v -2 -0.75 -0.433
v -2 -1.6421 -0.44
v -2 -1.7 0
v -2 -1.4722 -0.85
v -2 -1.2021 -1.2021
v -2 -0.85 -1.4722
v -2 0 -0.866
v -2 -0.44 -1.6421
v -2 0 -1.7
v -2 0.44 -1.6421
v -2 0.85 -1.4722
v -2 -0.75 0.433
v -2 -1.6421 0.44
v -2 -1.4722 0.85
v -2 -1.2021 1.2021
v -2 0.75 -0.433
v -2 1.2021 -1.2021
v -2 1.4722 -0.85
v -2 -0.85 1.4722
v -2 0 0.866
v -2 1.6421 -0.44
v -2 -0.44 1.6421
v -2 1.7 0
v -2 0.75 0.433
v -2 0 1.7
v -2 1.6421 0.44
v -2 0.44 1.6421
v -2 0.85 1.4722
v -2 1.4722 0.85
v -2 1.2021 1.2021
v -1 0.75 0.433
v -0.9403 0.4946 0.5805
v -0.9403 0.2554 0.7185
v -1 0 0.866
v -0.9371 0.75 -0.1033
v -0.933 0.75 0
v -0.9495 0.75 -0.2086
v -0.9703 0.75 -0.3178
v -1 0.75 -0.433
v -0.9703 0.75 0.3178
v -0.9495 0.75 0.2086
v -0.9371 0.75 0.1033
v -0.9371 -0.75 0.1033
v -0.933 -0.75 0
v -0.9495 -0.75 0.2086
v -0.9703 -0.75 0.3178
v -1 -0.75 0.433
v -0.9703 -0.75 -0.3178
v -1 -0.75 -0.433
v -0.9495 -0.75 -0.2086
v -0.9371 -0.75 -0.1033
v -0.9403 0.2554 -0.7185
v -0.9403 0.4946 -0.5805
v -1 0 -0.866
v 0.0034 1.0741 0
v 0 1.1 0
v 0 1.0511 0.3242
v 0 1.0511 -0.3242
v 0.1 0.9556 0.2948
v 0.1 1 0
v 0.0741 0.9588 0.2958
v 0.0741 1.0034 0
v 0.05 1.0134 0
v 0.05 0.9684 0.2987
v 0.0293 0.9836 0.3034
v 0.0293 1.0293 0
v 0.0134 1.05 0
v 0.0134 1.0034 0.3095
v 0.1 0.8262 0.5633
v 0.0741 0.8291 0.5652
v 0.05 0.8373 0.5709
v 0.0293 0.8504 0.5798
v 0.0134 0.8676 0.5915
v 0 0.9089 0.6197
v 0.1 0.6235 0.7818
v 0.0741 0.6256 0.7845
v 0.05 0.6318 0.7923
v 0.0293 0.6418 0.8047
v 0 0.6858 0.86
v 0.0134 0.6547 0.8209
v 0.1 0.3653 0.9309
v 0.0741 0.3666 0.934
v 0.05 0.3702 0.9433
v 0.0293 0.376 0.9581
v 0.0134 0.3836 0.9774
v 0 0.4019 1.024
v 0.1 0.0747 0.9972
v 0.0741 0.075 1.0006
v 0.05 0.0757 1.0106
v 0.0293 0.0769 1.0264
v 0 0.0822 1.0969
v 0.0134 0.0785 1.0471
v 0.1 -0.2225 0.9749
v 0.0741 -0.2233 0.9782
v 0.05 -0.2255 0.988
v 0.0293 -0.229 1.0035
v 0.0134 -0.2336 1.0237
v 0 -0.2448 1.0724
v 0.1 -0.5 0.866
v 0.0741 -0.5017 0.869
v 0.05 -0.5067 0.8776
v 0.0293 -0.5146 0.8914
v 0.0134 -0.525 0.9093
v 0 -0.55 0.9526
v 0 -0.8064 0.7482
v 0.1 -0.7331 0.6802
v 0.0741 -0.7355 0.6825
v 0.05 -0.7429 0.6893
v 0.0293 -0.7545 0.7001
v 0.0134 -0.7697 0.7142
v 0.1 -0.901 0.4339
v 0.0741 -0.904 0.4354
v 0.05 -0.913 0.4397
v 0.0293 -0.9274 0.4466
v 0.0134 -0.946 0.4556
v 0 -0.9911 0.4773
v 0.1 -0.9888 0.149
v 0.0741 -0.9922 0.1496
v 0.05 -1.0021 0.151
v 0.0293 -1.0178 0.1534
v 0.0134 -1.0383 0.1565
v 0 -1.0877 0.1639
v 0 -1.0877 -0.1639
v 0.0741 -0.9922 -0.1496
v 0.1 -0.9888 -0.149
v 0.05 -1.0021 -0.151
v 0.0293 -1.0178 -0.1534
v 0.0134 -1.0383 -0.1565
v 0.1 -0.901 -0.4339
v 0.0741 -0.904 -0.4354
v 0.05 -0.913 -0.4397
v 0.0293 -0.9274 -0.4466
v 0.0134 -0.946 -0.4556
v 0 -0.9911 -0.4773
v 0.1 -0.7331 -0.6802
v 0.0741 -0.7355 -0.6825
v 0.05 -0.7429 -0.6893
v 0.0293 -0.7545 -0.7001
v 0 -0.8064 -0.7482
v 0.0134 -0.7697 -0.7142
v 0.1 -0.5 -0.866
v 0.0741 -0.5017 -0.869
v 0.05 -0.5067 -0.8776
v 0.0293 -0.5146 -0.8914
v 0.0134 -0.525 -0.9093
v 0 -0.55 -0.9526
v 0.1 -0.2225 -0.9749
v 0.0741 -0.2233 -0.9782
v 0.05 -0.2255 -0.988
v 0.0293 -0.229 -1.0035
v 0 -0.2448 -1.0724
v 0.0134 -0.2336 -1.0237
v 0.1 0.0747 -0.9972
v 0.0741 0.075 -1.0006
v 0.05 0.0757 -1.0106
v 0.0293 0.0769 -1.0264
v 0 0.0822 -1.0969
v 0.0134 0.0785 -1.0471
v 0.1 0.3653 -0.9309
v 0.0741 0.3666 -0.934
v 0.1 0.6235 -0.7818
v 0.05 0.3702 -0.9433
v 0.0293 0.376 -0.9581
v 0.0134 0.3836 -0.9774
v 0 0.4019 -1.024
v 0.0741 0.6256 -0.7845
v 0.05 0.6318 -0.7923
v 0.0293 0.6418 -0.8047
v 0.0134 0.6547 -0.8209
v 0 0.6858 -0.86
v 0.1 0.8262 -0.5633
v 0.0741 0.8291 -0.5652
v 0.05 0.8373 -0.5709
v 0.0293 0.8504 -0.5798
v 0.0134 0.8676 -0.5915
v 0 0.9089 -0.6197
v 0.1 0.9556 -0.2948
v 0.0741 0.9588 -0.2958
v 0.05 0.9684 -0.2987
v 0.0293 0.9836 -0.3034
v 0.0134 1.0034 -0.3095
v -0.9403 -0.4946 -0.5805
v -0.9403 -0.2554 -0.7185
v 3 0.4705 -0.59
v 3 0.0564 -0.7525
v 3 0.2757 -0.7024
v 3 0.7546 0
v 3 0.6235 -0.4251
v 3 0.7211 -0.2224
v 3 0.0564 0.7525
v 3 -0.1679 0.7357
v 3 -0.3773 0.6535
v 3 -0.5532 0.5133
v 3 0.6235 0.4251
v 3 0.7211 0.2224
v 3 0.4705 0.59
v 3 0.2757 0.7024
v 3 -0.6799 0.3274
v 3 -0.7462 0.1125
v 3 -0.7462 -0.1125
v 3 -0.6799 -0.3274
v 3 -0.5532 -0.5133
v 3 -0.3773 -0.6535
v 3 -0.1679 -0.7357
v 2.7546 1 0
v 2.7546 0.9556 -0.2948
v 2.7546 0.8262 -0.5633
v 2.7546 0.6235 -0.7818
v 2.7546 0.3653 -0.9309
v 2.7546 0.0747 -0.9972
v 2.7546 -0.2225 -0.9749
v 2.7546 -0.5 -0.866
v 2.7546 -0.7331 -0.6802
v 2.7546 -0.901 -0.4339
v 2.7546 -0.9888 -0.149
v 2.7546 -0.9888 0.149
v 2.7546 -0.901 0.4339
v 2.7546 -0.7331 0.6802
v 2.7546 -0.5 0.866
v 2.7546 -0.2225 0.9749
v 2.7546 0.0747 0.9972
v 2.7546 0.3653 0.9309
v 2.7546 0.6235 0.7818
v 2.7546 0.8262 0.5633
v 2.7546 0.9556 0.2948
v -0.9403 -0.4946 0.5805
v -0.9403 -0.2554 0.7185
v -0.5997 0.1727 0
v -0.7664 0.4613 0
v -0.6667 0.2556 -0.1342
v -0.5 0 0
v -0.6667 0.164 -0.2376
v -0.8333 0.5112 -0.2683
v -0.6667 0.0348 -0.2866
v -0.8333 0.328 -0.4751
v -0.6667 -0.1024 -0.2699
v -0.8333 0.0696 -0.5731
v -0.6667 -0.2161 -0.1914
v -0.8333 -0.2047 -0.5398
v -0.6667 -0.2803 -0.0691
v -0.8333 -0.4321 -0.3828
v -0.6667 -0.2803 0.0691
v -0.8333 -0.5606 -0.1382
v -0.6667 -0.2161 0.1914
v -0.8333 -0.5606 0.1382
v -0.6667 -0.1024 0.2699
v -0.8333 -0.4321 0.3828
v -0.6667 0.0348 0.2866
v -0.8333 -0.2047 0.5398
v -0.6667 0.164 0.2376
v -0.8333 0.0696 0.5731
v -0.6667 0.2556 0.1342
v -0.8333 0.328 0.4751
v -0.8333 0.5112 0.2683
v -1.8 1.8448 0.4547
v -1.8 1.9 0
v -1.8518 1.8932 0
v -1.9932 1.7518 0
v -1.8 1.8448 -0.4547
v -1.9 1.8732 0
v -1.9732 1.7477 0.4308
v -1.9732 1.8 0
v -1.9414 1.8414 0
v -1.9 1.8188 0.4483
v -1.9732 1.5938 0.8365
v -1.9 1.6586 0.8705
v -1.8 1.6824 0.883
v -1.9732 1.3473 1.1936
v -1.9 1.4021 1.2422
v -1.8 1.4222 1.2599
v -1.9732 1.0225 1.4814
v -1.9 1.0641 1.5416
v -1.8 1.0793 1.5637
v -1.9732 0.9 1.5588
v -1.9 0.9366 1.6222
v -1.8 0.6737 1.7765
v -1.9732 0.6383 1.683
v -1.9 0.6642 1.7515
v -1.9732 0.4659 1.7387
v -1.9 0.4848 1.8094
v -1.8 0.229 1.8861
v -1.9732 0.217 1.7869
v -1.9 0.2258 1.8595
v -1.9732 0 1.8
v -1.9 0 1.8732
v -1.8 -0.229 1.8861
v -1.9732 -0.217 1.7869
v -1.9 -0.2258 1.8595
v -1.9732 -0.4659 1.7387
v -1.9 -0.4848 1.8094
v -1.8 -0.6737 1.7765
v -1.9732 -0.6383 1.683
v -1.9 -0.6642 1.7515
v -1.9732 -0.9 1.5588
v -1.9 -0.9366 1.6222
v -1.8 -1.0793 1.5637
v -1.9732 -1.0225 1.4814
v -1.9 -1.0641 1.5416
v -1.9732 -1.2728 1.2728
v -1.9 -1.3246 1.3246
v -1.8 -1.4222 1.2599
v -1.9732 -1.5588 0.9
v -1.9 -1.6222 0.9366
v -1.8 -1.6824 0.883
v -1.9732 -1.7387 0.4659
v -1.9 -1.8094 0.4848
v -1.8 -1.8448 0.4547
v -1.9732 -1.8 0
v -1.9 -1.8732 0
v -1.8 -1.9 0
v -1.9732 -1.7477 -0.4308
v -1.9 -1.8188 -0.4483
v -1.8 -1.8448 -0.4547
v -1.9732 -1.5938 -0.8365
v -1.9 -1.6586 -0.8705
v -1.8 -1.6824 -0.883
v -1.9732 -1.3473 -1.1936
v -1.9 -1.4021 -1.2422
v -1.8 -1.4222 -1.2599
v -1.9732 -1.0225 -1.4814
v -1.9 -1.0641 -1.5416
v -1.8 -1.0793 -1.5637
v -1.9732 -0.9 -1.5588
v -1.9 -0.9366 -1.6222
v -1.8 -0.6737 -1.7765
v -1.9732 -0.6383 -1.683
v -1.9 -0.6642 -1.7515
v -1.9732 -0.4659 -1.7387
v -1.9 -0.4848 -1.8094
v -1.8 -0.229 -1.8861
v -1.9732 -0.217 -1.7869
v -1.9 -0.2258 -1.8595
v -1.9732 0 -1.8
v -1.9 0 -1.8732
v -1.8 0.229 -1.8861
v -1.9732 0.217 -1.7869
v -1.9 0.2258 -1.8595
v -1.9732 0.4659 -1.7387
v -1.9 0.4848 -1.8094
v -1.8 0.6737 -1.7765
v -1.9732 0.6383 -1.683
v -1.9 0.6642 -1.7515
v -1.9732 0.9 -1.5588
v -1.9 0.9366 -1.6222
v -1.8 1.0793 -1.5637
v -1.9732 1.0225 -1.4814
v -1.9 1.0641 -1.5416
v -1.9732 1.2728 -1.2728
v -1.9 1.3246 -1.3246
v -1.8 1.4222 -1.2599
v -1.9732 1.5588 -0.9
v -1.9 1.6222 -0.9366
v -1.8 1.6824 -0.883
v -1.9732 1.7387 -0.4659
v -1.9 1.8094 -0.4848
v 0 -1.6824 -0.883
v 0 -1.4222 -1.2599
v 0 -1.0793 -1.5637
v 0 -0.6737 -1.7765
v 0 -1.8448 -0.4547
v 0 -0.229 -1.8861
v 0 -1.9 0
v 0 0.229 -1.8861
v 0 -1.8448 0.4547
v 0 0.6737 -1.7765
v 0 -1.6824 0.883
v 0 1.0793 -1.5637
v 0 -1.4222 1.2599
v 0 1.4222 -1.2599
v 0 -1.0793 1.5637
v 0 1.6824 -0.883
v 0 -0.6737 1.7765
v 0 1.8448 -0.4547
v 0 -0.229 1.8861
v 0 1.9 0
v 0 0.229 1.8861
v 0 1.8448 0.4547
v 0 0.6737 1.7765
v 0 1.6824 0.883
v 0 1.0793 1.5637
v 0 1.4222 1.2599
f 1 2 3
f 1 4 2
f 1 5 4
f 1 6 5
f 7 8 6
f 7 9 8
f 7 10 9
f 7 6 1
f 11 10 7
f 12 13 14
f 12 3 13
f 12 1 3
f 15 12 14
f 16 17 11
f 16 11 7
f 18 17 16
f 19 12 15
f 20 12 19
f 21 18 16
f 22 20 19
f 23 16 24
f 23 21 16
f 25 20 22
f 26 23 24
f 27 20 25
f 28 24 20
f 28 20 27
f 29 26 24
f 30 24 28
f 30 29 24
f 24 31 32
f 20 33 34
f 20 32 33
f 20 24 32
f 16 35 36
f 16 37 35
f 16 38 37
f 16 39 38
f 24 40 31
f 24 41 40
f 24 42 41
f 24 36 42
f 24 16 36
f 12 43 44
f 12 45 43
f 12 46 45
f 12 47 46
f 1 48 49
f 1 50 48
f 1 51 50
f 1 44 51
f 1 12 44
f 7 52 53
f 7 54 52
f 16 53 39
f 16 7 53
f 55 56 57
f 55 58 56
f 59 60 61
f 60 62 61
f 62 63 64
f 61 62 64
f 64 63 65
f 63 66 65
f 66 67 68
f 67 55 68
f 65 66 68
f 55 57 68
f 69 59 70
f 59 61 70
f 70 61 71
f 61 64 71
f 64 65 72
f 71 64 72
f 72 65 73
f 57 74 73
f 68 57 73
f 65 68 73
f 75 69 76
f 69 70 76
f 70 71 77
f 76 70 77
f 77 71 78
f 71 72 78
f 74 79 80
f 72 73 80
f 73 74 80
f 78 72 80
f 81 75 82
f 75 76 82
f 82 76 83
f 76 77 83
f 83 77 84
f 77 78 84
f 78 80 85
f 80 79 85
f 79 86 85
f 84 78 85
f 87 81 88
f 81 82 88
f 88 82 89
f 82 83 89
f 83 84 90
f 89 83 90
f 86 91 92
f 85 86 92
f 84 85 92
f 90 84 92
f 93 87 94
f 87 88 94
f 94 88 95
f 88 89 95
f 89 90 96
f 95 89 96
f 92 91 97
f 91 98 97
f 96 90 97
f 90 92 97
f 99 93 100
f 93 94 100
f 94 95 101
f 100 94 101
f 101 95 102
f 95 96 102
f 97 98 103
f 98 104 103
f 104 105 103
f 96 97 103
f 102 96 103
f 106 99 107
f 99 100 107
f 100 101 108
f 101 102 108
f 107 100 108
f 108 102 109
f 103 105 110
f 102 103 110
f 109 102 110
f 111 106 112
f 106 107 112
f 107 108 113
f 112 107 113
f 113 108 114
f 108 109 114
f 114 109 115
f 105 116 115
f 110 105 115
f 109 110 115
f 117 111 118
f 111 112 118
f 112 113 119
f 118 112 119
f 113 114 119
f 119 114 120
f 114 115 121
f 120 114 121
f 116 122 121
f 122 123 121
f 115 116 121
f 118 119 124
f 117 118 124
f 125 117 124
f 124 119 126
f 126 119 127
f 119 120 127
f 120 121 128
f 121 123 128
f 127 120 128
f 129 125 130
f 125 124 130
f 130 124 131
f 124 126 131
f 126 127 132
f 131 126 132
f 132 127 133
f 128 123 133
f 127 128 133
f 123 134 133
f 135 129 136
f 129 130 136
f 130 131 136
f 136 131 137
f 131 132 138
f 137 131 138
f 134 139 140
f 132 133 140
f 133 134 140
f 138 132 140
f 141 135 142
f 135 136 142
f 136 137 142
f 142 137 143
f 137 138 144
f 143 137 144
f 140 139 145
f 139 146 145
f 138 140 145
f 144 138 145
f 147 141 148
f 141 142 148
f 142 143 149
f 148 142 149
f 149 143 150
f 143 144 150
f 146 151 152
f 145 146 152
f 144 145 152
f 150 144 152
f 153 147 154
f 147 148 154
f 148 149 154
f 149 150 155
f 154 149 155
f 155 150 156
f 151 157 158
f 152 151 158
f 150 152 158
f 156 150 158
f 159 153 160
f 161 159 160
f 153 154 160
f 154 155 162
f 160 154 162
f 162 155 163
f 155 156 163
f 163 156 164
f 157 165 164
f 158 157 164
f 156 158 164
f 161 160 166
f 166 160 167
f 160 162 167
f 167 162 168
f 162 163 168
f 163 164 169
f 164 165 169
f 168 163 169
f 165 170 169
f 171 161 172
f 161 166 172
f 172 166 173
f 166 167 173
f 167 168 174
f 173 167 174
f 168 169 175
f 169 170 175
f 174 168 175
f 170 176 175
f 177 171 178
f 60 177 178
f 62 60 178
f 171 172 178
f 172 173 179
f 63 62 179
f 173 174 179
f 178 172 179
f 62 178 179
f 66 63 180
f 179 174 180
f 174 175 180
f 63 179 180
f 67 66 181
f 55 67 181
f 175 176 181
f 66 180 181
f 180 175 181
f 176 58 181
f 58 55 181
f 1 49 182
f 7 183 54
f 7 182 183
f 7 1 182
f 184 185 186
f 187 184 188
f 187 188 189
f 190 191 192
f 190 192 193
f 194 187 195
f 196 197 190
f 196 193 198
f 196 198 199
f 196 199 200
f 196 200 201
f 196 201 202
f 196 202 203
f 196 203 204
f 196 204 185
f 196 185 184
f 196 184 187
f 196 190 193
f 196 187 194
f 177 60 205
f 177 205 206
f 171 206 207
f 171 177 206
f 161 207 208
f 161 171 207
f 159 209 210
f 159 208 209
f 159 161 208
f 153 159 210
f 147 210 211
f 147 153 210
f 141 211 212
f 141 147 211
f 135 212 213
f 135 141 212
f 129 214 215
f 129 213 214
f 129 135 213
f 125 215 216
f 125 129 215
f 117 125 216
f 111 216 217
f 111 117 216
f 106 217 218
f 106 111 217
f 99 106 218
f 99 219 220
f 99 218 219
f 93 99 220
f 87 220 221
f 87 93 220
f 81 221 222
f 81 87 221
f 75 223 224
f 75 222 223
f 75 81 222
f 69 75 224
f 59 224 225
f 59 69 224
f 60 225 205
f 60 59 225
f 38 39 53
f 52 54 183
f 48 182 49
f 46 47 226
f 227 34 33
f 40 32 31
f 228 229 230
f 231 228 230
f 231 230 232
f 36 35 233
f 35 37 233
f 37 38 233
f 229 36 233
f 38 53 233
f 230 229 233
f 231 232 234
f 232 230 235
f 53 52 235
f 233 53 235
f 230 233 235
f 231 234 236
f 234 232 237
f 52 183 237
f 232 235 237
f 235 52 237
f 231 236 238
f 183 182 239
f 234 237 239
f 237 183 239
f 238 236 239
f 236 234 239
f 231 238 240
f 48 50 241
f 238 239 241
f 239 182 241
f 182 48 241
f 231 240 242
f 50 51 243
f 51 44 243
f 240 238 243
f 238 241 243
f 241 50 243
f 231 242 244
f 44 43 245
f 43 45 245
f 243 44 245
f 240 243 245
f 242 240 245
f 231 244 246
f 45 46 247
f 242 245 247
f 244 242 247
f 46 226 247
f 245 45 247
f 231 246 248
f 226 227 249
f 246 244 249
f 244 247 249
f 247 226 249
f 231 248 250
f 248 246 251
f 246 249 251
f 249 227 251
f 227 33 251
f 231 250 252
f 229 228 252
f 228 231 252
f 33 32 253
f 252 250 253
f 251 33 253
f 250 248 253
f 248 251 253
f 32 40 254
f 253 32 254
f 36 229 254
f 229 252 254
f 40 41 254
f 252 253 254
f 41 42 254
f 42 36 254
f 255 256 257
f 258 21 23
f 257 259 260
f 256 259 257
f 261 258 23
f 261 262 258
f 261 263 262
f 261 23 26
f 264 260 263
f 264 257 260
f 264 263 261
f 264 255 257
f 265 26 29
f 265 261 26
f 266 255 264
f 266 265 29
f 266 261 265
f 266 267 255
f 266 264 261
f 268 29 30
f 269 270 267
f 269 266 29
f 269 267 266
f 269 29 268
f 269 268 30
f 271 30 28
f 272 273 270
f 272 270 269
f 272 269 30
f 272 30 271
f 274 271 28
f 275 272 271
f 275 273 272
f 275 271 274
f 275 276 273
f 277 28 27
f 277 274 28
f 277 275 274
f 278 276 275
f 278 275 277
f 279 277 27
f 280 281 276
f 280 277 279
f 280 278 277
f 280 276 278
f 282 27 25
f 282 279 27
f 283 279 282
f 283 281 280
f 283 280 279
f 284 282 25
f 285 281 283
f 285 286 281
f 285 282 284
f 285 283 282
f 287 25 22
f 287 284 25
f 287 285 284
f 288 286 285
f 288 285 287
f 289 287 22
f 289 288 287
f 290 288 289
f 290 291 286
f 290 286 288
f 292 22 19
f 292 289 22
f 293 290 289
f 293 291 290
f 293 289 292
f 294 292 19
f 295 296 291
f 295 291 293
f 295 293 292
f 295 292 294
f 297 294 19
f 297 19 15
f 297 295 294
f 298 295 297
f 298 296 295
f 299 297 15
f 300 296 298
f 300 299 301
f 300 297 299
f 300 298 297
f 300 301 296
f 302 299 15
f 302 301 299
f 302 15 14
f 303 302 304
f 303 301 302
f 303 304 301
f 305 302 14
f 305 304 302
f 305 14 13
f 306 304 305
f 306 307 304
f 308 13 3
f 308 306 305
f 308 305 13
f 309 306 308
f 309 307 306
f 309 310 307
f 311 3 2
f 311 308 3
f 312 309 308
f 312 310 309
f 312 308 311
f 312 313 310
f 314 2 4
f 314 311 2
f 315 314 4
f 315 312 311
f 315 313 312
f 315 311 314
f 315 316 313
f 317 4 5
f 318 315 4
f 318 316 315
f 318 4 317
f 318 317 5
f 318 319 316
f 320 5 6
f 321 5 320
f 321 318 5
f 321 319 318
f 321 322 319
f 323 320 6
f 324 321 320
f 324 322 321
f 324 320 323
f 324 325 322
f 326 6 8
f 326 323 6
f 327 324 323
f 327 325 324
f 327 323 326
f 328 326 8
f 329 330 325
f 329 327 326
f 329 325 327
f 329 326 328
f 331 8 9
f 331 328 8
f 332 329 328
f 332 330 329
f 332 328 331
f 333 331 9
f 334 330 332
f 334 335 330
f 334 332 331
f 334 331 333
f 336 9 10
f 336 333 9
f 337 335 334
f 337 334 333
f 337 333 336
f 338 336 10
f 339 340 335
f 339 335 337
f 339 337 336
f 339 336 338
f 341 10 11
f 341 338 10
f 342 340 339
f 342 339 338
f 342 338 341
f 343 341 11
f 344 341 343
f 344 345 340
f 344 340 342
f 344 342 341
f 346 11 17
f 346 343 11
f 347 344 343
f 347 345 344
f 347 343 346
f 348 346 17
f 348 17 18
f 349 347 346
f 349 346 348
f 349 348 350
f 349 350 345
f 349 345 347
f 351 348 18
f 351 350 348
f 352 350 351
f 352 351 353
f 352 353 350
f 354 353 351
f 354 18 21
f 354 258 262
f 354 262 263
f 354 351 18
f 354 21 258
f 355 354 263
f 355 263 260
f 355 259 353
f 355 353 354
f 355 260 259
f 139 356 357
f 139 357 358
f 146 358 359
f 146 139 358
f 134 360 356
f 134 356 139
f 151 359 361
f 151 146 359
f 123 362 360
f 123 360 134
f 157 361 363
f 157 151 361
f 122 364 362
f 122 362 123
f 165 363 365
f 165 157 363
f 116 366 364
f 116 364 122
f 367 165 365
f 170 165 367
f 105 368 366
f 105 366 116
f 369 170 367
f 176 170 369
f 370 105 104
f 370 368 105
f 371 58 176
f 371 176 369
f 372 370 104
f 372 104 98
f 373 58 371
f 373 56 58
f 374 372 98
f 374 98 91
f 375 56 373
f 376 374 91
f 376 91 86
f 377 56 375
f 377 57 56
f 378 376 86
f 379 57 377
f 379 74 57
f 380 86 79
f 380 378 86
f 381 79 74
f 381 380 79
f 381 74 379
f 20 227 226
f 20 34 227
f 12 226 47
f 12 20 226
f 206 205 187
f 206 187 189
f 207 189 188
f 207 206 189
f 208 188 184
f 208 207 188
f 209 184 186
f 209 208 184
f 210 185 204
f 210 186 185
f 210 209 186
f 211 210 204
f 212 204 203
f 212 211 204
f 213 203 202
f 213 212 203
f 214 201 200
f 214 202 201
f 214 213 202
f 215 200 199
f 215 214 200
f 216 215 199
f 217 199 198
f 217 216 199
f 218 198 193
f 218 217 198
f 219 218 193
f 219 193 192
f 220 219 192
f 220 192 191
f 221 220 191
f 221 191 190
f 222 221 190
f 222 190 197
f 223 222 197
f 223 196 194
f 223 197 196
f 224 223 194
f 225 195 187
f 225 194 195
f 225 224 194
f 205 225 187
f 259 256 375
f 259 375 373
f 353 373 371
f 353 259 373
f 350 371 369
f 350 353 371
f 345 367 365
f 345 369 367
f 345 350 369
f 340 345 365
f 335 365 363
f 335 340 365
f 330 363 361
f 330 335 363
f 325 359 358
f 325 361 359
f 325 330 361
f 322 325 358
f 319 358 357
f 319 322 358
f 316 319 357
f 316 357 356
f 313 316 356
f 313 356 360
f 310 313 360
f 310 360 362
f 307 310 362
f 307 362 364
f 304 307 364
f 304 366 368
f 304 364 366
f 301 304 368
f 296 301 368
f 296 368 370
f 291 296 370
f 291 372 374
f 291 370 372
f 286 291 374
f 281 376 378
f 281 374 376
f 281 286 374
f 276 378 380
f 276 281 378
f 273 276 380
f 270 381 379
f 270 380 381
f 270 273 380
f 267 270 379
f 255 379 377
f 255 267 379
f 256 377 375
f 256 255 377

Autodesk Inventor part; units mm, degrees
ref_plane "YZ Plane" through (0, 0, 0) normal (1, 0, 0) x (0, 1, 0)
ref_plane "XZ Plane" through (0, 0, 0) normal (0, 1, 0) x (-1, 0, 0)
sketch "Sketch1" plane through (0, 0, 0) normal (0, 0, 1) x (1, 0, 0)
  line L0 (-0.5, 0) -> (3, 0)
  line L1 (3, 0) -> (3, 1)
  line L2 (3, 1) -> (1.0454, 1)
  line L3 (1.0454, 1) -> (0.7999, 1)
  line L4 (0.7999, 1) -> (0, 1)
  line L5 (0, 1) -> (0, 1.9)
  line L6 (0, 1.9) -> (-2, 1.9)
  line L7 (-2, 1.9) -> (-2, 0.866)
  line L8 (-2, 0.866) -> (-1, 0.866)
  line L9 (-1, 0.866) -> (-0.5, 0)
  line L10 (-3, 0) -> (4, 0) projected
  line L11 (0, -0.38) -> (0, 2.28) projected
  line L12 (1.0454, 1) -> (0, 1) construction
  dimension "d1" = 1.9546
  dimension "d2" = 0.2455
  dimension "d3" = 2
  dimension "d4" = 1
  dimension "d5" = 60
  dimension "d6" = 2
  dimension "d7" = 2
  dimension "d8" = 1.7321
  dimension "d9" = 3.8
  dimension "d26" = 3
revolve "Body" add sketch "Sketch1" angle 360 about axis through (-0.5, 0, 0) along (1, 0, 0)
sketch "Sketch2" plane through (-2, 0, 0) normal (-1, 0, 0) x (0, 0, 1)
  circle A0 centre (0, 0) radius 0.866 projected
  line L0 (0, -2.66) -> (0, 2.66) projected
  line L1 (-2.66, 0) -> (2.66, 0) projected
  line L2 (0.866, 0) -> (0.433, -0.75)
  line L3 (0.433, -0.75) -> (-0.433, -0.75)
  line L4 (-0.433, -0.75) -> (-0.866, 0)
  line L5 (-0.866, 0) -> (-0.433, 0.75)
  line L6 (-0.433, 0.75) -> (0.433, 0.75)
  line L7 (0.433, 0.75) -> (0.866, 0)
  point P0 (0, 0)
extrude "Slot" add sketch "Sketch2" against normal up to next contours L7 A0 | A0 L2 | L6 L0 A0 | A0 L0 L3 | L0 L6 A0 | A0 L3 L0 | L4 A0 | A0 L5
fillet "Fillet1" radius 0.2 1 edges at (-2, -1.9, 0)
thread "Thread" size "M2x0.4" class "6g" standard "ISO Metric profile" length 1.9546
chamfer "Chamfer1" distance 0.2454 distance2 0.2454 1 edges at (3, -1, 0) measured on face at (3, -0.4588, -0.3309)
ref_plane "Work Plane1" through (29, 0, 0) normal (0, -1, 0) x (1, 0, 0)
fillet "Fillet2" radius 0.1 1 edges at (0, -1, 0)
equation "\"d30\" = R"
equation "\"d17\" = RR"
equation "\"d13\" = GEL"
equation "\"d15\" = -0.5 * SPD + 0.5 * GD"
equation "\"d16\" = GUL"
equation "\"d1\" = GEL"
equation "\"d3\" = KOH"
equation "\"d4\" = INTI"
equation "\"d6\" = GD"
equation "\"d7\" = BDM"
equation "\"d8\" = 1.1547 * SW"
equation "\"d9\" = KOD"
equation "\"d26\" = NLG"
equation "\"GD\" = NND"
equation "\"NLG\" = 3"
equation "\"GEL\" = 1.95462"
equation "\"KOD\" = 3.8"
equation "\"KOH\" = 2"
equation "\"INTI\" = 1"
equation "\"GAL\" = 0.61345 * PTC"
equation "\"GUL\" = 0.61345 * PTC"
equation "\"BDM\" = NND"
equation "\"SW\" = 1.5"
equation "\"RR\" = 0.2"
equation "\"SPD\" = 1.50924"
equation "\"R\" = 0.1"
equation "\"TOA\" = 30deg"
equation "\"THREADDIA\" = 2"
equation "\"PTC\" = 0.4"
equation "\"NND\" = 2"
equation "\"E0\" = 1.155 * SW"
equation "\"GD1\" = THREADDIA - 1.2269 * PTC"
properties part number "ANSI B18.3.1M - M2x0.4 x 3" material "Steel, Mild"
